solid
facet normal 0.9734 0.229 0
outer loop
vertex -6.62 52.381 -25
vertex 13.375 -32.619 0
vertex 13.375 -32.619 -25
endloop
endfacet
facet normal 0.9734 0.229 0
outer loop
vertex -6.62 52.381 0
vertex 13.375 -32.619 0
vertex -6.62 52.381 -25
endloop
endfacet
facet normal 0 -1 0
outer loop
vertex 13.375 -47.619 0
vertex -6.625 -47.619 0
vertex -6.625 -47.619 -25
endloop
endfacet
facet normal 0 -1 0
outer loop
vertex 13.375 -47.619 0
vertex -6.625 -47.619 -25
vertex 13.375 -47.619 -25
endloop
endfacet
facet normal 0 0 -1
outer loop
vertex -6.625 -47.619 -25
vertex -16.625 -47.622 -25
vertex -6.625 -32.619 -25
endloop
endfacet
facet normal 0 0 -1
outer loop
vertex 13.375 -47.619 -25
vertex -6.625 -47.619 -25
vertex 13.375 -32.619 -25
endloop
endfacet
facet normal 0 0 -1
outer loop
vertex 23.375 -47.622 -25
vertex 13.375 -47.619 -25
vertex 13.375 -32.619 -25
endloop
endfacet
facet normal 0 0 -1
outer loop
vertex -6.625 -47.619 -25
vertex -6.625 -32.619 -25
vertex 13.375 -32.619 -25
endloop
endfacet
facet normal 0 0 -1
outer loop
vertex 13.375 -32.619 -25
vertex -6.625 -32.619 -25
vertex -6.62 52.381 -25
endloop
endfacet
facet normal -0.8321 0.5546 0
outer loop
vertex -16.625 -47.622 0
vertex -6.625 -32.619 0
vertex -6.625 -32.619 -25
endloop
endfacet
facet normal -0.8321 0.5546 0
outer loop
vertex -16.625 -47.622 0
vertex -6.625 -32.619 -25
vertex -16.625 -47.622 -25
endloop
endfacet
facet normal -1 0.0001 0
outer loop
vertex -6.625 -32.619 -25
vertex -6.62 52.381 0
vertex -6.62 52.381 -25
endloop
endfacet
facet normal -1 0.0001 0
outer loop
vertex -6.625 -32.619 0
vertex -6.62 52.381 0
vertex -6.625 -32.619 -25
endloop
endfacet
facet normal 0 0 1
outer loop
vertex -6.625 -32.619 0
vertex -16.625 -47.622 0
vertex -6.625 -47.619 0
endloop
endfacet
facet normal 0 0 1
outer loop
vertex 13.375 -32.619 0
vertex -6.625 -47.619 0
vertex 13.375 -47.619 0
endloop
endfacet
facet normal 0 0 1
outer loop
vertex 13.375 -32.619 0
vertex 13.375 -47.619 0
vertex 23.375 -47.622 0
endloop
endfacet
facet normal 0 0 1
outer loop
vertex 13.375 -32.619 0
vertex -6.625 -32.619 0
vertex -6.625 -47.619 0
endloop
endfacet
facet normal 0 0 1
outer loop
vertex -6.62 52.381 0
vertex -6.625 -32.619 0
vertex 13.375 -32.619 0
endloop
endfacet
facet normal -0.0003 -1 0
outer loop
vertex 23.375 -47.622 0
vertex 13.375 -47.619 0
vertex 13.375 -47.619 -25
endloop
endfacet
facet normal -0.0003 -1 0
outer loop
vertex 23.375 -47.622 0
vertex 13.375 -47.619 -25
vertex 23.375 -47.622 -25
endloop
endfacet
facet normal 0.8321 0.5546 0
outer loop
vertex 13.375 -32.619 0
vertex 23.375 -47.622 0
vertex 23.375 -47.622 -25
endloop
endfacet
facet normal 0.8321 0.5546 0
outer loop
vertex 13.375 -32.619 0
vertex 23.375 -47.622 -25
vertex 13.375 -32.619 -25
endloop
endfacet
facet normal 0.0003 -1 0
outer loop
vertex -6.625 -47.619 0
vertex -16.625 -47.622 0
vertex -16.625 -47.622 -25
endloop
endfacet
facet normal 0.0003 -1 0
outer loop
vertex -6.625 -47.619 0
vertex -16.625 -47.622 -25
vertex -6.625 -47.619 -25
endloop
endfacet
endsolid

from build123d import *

# Parameters (mm, degrees)
F0_W     = 20
F0_H     = 15
F1_DEPTH = 25


with BuildPart() as f1:
    # F0 (on Top) → F1 (new body)
    with BuildSketch(Plane.XY):
        Polygon((-6.619532, 52.380648), (-6.624972, -32.619352), (13.375028, -32.619352), align=None)
        with Locations((3.375028, -40.119352)):
            Rectangle(F0_W, F0_H)
        Polygon((-6.624972, -47.619352), (-6.624972, -32.619352), (-16.624971, -47.622049), align=None)
        Polygon((23.375028, -47.622049), (13.375028, -32.619352), (13.375028, -47.619352), align=None)
    extrude(amount=-F1_DEPTH)


solid = f1.part
